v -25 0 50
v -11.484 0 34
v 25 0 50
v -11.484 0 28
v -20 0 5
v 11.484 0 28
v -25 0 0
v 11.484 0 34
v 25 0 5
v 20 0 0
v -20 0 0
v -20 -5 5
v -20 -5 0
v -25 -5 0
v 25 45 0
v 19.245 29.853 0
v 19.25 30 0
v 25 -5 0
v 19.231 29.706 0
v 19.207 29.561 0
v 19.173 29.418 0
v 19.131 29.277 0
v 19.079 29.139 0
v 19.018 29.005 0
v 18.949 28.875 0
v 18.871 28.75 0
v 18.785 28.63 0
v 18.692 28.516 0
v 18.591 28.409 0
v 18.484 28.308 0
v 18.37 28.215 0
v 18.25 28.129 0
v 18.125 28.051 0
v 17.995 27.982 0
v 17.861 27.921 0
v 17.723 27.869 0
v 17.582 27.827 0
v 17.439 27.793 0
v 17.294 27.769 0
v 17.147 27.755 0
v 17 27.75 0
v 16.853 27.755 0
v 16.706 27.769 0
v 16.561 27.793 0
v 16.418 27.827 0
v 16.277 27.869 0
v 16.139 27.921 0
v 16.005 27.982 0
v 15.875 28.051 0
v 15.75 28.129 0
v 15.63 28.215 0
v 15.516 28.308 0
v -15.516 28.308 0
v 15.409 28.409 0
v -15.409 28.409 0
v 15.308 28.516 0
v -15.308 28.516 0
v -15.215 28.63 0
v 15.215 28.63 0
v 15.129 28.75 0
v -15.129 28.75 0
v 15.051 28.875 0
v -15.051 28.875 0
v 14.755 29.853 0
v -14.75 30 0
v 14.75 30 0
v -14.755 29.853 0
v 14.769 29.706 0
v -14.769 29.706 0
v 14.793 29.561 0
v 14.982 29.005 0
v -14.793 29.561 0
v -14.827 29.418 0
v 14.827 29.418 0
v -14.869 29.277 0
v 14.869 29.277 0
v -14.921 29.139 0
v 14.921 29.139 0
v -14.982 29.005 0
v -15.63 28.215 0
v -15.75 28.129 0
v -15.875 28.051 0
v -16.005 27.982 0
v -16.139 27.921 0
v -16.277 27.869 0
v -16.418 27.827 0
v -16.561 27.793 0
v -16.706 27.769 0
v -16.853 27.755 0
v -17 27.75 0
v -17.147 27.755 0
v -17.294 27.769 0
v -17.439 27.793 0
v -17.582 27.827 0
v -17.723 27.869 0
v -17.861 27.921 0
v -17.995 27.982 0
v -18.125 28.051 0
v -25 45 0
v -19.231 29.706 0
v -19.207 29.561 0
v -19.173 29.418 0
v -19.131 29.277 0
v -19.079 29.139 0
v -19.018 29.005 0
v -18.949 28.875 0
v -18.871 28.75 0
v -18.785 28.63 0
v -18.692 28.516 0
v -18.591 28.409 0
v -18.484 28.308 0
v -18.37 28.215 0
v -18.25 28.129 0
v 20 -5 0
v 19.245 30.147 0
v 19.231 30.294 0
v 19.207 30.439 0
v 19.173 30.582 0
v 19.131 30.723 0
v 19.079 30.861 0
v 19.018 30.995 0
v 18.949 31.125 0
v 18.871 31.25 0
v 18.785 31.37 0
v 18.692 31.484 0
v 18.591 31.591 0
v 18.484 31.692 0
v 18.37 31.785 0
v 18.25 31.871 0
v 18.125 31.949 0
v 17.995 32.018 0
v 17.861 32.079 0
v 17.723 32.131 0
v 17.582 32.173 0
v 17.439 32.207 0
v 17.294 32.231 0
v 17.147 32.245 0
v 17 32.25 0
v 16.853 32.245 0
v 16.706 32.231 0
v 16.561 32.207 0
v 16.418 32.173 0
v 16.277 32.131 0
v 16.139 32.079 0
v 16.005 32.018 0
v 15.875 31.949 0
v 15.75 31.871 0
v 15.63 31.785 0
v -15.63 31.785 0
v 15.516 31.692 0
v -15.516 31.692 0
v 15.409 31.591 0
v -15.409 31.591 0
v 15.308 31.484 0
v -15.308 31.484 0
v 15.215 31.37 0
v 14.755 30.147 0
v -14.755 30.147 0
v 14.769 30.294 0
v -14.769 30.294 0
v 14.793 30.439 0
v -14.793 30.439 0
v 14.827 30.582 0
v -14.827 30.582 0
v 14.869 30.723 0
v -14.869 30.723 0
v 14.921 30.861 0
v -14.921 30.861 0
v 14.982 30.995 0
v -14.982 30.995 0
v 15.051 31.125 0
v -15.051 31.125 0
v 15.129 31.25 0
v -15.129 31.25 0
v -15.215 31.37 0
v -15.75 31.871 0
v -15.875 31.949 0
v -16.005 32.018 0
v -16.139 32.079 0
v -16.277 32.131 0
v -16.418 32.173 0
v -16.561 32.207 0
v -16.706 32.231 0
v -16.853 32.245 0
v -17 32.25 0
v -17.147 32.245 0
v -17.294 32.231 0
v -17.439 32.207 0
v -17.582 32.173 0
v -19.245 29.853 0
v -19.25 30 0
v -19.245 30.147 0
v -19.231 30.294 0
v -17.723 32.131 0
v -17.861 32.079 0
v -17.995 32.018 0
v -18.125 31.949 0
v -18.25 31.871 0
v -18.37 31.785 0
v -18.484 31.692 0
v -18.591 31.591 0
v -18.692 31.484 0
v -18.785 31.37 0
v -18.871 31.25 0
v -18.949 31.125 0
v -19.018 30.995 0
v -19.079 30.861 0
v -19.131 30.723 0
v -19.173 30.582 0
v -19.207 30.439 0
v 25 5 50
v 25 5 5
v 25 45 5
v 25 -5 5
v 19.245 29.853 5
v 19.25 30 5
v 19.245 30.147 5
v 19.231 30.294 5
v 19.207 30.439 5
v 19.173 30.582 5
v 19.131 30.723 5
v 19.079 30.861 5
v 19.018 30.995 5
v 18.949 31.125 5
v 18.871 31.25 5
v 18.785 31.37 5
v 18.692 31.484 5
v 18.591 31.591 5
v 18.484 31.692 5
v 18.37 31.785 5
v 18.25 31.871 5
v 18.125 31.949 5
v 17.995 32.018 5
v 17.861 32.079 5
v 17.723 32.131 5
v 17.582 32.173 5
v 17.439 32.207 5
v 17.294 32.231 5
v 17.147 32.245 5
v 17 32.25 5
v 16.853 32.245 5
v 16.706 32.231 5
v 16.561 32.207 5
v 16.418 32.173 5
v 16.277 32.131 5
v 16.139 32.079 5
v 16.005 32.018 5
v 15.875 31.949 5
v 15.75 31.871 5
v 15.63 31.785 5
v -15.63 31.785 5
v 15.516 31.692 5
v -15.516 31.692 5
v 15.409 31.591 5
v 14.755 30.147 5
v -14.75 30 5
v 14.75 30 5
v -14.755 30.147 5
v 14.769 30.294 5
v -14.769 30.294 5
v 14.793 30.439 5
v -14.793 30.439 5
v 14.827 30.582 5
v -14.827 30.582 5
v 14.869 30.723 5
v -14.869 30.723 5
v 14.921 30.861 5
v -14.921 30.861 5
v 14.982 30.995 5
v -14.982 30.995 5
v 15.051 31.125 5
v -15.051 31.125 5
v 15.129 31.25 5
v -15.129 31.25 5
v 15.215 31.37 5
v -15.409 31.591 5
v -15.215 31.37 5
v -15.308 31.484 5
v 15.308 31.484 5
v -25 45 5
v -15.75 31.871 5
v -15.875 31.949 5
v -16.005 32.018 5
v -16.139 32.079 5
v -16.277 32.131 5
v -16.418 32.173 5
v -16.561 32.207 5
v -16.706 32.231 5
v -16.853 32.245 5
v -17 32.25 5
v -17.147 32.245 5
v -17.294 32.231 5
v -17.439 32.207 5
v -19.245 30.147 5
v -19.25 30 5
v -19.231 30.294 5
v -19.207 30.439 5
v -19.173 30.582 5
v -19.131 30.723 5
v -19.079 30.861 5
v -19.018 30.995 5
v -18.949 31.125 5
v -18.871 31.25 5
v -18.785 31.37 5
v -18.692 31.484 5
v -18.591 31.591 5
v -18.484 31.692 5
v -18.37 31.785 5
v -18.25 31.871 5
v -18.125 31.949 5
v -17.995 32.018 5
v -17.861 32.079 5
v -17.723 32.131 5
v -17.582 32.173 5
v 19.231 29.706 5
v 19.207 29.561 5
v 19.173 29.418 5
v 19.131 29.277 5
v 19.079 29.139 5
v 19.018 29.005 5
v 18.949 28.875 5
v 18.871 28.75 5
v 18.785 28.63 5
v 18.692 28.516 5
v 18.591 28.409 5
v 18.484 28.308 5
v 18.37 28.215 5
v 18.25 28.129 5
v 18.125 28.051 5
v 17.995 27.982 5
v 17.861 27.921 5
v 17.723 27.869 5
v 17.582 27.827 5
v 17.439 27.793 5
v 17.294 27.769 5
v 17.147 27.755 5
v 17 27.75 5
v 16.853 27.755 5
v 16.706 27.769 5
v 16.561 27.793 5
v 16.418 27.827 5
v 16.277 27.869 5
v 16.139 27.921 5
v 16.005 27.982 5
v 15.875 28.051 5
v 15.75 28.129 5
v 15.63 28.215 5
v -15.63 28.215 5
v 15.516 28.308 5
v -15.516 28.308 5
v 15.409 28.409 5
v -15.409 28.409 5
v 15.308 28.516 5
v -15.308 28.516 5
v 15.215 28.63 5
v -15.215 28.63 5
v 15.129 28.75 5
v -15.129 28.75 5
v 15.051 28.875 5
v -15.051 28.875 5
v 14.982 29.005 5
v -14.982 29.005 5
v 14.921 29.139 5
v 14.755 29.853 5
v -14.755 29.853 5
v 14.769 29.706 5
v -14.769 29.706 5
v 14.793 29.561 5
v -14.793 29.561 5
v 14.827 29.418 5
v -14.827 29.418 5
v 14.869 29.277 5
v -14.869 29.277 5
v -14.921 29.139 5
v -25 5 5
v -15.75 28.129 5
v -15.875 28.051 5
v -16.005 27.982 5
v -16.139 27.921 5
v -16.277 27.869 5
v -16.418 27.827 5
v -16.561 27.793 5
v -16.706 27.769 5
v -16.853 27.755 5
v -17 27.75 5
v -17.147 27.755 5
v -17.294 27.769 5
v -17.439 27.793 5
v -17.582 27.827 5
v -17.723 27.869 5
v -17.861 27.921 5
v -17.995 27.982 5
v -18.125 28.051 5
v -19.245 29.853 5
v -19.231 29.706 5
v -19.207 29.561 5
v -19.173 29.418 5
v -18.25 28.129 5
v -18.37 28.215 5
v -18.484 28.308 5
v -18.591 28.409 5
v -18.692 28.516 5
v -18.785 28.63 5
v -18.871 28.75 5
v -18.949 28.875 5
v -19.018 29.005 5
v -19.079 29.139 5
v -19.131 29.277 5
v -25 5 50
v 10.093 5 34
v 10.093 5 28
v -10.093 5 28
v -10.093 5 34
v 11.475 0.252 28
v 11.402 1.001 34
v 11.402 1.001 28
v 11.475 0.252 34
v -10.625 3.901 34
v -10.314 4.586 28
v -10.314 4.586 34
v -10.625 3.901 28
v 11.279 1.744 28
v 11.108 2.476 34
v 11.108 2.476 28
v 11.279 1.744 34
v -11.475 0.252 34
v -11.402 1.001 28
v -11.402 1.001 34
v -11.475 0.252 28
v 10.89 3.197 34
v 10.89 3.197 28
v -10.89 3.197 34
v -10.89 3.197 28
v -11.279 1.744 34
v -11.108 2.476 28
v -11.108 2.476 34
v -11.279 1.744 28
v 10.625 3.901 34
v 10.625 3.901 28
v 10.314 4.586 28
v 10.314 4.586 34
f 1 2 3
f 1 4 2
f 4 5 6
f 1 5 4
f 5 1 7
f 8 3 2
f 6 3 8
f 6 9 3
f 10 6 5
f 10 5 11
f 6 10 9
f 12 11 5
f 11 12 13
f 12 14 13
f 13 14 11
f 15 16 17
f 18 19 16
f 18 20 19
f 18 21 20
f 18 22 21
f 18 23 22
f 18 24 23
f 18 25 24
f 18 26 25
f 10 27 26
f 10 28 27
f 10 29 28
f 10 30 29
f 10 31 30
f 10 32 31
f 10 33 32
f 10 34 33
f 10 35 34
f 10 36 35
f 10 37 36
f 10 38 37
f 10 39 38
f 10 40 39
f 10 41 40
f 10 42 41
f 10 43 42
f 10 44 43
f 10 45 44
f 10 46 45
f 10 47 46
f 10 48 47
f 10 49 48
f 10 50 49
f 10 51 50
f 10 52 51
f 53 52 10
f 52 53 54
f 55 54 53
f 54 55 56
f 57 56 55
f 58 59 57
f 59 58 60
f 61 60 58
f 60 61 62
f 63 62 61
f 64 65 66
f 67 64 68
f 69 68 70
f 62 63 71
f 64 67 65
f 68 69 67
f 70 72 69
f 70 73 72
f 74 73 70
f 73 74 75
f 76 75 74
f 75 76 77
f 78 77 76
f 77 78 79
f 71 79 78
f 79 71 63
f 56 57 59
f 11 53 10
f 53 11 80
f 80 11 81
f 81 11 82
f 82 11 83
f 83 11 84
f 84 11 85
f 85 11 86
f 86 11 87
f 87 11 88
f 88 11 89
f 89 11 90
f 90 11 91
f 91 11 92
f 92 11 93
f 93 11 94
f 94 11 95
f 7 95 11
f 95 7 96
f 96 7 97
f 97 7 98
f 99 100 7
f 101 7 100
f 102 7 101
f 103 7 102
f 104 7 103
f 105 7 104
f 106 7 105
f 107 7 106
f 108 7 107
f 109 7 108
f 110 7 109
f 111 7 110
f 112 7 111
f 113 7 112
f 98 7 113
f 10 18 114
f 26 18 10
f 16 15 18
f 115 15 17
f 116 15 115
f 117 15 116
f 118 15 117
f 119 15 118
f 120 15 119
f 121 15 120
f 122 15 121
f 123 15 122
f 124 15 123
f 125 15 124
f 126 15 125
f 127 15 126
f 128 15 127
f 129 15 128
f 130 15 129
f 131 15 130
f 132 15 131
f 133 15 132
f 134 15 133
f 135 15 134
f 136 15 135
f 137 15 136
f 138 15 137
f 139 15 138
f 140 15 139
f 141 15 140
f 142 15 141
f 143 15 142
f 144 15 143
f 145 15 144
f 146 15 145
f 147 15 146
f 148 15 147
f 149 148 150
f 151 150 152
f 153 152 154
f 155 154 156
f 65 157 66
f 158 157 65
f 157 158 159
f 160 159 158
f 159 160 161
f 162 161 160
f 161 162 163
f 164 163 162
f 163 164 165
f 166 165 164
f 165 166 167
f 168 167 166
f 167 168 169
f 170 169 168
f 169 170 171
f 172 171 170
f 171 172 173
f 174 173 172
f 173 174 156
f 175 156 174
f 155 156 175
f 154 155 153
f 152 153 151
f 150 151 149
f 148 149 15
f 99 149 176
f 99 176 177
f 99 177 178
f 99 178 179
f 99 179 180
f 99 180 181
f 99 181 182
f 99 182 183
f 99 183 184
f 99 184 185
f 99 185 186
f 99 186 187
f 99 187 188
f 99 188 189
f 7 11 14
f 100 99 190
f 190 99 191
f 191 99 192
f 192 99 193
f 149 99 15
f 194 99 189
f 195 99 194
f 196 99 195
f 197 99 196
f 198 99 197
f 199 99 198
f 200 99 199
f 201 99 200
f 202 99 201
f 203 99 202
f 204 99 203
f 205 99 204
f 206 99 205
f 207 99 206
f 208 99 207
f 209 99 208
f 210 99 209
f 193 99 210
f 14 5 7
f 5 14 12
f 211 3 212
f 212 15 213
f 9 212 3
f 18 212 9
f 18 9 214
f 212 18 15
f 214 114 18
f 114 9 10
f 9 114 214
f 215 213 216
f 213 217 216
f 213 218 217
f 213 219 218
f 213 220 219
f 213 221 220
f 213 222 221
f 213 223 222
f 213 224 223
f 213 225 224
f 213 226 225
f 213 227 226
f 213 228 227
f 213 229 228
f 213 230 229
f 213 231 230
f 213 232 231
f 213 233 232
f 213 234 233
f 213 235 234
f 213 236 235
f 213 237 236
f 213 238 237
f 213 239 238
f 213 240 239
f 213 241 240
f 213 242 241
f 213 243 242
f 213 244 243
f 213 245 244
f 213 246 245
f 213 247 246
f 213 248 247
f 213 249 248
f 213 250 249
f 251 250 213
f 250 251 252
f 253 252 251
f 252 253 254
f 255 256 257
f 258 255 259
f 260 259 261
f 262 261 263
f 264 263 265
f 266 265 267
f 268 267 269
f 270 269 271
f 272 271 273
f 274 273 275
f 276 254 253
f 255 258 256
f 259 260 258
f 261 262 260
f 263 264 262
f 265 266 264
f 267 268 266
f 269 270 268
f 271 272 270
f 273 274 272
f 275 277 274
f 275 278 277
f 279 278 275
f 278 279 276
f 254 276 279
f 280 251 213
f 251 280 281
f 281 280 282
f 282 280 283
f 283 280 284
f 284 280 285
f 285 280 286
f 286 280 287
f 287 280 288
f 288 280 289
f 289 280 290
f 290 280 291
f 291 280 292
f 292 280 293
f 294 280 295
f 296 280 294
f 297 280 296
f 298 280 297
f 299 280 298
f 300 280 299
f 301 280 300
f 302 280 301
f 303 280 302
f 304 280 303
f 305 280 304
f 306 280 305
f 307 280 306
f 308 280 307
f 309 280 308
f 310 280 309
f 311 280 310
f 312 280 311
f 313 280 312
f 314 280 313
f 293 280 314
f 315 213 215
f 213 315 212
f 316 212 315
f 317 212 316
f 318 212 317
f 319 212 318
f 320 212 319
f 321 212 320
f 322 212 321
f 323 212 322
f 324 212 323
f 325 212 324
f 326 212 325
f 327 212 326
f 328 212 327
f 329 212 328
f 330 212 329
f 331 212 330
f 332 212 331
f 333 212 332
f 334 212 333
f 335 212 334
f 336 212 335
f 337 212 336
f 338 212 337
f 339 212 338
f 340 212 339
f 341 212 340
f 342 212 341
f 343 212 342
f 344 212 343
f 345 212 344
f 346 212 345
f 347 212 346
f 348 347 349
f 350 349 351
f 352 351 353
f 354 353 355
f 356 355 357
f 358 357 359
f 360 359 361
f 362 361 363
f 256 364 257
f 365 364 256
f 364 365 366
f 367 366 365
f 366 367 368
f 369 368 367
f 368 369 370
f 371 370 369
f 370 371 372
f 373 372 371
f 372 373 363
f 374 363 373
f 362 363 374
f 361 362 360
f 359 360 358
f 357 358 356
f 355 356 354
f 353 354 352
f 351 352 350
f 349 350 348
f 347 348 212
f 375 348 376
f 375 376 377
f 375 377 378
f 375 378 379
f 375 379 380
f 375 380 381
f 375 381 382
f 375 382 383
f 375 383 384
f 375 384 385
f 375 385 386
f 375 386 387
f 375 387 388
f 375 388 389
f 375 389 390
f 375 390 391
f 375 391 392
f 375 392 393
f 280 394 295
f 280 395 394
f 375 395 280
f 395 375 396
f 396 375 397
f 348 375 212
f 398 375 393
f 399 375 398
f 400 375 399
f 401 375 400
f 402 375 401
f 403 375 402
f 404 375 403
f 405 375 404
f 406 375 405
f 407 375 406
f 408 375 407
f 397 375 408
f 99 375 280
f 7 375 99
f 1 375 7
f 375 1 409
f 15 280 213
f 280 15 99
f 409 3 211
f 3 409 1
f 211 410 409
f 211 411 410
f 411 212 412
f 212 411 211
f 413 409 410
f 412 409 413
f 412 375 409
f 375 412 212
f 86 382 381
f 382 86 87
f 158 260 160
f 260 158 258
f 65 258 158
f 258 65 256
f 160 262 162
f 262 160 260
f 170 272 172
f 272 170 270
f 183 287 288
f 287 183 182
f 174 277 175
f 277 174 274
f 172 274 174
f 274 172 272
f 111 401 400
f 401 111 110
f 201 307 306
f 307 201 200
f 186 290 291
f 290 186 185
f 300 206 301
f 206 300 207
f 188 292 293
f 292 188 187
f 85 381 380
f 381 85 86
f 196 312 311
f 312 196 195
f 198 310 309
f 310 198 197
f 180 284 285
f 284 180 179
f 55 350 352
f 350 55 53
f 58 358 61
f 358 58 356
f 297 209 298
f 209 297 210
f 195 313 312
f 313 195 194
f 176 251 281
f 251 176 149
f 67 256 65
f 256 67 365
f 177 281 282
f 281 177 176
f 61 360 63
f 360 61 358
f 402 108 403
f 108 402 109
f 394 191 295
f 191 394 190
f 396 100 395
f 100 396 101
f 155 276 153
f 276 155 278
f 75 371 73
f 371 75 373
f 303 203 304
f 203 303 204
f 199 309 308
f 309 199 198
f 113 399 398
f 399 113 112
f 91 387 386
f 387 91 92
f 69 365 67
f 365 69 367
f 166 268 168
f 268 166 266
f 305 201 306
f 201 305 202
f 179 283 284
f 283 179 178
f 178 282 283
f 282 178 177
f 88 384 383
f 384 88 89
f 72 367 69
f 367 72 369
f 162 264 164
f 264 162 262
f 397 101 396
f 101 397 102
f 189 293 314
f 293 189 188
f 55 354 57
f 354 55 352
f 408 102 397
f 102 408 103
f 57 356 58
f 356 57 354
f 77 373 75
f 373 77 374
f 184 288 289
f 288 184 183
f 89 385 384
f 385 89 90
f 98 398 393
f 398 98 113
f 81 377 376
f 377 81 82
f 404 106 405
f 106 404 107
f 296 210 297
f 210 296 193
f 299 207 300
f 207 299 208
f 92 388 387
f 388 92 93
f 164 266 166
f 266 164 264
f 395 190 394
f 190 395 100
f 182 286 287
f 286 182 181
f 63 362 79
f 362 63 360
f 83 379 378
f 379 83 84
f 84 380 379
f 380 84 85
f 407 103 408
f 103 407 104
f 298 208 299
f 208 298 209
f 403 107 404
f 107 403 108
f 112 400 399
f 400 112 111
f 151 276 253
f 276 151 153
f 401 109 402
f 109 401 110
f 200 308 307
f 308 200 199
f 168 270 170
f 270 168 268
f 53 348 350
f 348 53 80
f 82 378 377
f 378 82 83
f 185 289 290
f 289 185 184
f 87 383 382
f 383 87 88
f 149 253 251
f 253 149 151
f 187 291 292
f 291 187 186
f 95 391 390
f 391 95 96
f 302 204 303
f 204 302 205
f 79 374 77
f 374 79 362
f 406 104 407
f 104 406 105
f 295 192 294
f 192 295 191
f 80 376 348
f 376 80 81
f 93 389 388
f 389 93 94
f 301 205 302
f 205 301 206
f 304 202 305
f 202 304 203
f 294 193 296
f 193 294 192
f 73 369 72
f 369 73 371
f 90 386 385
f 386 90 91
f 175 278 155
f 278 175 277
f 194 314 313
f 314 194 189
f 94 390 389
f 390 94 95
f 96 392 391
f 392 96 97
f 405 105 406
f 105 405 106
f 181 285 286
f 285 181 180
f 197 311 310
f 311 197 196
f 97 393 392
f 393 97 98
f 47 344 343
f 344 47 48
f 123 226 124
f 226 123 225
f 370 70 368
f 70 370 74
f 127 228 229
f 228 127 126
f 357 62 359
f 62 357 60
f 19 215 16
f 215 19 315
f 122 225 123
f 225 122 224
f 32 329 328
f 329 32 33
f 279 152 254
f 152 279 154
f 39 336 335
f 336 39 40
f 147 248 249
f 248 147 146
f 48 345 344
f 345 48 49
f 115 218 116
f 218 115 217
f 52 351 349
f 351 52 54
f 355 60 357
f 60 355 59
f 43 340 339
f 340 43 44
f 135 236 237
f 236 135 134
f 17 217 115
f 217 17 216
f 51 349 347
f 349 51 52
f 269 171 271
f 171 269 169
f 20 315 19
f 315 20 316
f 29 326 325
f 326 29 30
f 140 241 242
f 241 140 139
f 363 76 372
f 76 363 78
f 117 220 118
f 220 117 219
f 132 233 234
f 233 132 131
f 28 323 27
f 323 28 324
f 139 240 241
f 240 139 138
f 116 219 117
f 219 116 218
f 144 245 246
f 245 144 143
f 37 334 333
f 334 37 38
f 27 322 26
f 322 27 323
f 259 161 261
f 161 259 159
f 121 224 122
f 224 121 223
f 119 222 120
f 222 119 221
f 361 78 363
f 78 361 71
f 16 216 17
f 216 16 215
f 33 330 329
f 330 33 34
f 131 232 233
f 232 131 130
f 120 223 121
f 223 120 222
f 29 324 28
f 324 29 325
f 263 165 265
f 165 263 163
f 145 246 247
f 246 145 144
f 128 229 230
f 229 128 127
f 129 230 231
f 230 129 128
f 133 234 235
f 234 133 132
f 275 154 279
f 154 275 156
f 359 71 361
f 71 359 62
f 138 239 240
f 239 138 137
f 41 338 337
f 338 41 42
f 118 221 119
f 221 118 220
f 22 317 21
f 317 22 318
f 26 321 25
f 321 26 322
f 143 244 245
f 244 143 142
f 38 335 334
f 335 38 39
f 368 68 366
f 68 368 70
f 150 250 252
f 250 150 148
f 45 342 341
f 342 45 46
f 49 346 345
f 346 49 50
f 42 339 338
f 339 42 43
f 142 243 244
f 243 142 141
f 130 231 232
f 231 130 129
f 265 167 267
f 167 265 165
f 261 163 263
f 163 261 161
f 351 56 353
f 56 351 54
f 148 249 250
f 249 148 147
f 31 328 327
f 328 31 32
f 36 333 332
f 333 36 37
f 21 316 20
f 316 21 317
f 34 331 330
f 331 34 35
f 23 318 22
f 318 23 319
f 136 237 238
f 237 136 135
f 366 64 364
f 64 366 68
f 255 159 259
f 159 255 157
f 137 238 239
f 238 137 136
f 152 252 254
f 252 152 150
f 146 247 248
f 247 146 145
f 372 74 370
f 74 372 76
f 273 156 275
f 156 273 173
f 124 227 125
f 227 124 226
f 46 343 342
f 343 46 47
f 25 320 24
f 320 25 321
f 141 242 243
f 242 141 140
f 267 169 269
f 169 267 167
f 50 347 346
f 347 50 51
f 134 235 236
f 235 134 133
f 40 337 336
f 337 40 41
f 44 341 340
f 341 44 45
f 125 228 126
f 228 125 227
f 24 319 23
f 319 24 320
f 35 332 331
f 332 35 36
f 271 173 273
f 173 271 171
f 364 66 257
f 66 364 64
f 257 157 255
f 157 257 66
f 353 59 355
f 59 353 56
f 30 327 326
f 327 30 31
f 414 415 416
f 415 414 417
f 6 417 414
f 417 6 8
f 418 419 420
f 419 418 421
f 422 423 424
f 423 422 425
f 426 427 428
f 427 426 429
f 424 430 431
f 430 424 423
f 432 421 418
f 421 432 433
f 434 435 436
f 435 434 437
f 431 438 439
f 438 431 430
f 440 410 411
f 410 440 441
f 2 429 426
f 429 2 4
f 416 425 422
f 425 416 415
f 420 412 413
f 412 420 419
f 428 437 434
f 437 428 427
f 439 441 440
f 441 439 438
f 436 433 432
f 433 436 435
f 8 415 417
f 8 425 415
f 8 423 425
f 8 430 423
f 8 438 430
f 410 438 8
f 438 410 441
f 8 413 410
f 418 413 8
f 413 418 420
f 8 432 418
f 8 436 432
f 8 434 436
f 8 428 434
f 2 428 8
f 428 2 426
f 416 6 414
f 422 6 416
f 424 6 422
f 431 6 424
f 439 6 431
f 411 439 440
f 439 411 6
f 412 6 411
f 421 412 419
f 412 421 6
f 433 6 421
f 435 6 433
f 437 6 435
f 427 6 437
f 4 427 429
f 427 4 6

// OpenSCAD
// L-shaped mounting bracket for NEMA 17 stepper motor (e.g. syringe pump)
// Print orientation: base plate on bed, vertical motor plate builds upward (+Z)

// ---------------- Parameters ----------------
plate_x      = 25;    // base plate half-width in X (mm)
plate_y      = 45;    // base plate length in Y (mm)
plate_t      = 5;     // base plate thickness in Z (mm)

hole_m4_x    = 17;    // M4 through-hole offset from centre in X (mm)
hole_m4_y    = 30;    // M4 through-hole Y position (mm)
hole_m4_d    = 4.5;   // M4 through-hole diameter (mm)

motor_hole_d = 23;    // motor centring boss hole diameter (mm)
motor_hole_x = 0;     // motor hole centre X (mm)
motor_hole_z = 28;    // motor hole centre Z (mm)

screw_d      = 3.4;   // M3 screw hole diameter (mm)
screw_pitch  = 31;    // square pattern pitch for screw holes (mm)

gusset_t     = 5;     // triangular gusset thickness (mm)
gusset_leg   = 20;    // gusset leg length along +Y and +Z (mm)

eps          = 0.5;   // cutter overshoot past faces (mm)
$fn          = 96;    // curve resolution

// ---------------- Model ----------------
difference() {
    union() {
        // Base plate
        translate([-plate_x, 0, 0])
            cube([plate_x * 2, plate_y, plate_t]);

        // Vertical motor plate
        translate([-plate_x, 0, 0])
            cube([plate_x * 2, plate_t, 50]);

        // Gussets: right triangles in YZ plane, flush with left/right edges
        for (sx = [-1, 1])
            translate([sx > 0 ? plate_x - gusset_t : -plate_x, 0, 0])
                rotate([90, 0, 0])
                    linear_extrude(height = gusset_t)
                        polygon(points = [
                            [gusset_t, gusset_t],   // outer corner (x = -20 or 20, y = 20)
                            [gusset_t, 0],          // along +Y to y = 5
                            [0, 0]                   // along +Z to z = 5
                        ]);
    }

    // Base plate M4 through-holes
    for (x = [-hole_m4_x, hole_m4_x])
        translate([x, hole_m4_y, -eps])
            cylinder(d = hole_m4_d, h = plate_t + 2 * eps);

    // Motor boss hole through vertical plate (along Y)
    translate([motor_hole_x, -eps, motor_hole_z])
        cylinder(d = motor_hole_d, h = plate_t + 2 * eps);

    // M3 screw holes on 31 mm square pattern, centred on boss hole
    for (a = [0, 90, 180, 270])
        rotate([0, 0, a])
            translate([screw_pitch / 2, screw_pitch / 2, 0])
                translate([motor_hole_x, 0, motor_hole_z])
                    cylinder(d = screw_d, h = plate_t + 2 * eps);
}
